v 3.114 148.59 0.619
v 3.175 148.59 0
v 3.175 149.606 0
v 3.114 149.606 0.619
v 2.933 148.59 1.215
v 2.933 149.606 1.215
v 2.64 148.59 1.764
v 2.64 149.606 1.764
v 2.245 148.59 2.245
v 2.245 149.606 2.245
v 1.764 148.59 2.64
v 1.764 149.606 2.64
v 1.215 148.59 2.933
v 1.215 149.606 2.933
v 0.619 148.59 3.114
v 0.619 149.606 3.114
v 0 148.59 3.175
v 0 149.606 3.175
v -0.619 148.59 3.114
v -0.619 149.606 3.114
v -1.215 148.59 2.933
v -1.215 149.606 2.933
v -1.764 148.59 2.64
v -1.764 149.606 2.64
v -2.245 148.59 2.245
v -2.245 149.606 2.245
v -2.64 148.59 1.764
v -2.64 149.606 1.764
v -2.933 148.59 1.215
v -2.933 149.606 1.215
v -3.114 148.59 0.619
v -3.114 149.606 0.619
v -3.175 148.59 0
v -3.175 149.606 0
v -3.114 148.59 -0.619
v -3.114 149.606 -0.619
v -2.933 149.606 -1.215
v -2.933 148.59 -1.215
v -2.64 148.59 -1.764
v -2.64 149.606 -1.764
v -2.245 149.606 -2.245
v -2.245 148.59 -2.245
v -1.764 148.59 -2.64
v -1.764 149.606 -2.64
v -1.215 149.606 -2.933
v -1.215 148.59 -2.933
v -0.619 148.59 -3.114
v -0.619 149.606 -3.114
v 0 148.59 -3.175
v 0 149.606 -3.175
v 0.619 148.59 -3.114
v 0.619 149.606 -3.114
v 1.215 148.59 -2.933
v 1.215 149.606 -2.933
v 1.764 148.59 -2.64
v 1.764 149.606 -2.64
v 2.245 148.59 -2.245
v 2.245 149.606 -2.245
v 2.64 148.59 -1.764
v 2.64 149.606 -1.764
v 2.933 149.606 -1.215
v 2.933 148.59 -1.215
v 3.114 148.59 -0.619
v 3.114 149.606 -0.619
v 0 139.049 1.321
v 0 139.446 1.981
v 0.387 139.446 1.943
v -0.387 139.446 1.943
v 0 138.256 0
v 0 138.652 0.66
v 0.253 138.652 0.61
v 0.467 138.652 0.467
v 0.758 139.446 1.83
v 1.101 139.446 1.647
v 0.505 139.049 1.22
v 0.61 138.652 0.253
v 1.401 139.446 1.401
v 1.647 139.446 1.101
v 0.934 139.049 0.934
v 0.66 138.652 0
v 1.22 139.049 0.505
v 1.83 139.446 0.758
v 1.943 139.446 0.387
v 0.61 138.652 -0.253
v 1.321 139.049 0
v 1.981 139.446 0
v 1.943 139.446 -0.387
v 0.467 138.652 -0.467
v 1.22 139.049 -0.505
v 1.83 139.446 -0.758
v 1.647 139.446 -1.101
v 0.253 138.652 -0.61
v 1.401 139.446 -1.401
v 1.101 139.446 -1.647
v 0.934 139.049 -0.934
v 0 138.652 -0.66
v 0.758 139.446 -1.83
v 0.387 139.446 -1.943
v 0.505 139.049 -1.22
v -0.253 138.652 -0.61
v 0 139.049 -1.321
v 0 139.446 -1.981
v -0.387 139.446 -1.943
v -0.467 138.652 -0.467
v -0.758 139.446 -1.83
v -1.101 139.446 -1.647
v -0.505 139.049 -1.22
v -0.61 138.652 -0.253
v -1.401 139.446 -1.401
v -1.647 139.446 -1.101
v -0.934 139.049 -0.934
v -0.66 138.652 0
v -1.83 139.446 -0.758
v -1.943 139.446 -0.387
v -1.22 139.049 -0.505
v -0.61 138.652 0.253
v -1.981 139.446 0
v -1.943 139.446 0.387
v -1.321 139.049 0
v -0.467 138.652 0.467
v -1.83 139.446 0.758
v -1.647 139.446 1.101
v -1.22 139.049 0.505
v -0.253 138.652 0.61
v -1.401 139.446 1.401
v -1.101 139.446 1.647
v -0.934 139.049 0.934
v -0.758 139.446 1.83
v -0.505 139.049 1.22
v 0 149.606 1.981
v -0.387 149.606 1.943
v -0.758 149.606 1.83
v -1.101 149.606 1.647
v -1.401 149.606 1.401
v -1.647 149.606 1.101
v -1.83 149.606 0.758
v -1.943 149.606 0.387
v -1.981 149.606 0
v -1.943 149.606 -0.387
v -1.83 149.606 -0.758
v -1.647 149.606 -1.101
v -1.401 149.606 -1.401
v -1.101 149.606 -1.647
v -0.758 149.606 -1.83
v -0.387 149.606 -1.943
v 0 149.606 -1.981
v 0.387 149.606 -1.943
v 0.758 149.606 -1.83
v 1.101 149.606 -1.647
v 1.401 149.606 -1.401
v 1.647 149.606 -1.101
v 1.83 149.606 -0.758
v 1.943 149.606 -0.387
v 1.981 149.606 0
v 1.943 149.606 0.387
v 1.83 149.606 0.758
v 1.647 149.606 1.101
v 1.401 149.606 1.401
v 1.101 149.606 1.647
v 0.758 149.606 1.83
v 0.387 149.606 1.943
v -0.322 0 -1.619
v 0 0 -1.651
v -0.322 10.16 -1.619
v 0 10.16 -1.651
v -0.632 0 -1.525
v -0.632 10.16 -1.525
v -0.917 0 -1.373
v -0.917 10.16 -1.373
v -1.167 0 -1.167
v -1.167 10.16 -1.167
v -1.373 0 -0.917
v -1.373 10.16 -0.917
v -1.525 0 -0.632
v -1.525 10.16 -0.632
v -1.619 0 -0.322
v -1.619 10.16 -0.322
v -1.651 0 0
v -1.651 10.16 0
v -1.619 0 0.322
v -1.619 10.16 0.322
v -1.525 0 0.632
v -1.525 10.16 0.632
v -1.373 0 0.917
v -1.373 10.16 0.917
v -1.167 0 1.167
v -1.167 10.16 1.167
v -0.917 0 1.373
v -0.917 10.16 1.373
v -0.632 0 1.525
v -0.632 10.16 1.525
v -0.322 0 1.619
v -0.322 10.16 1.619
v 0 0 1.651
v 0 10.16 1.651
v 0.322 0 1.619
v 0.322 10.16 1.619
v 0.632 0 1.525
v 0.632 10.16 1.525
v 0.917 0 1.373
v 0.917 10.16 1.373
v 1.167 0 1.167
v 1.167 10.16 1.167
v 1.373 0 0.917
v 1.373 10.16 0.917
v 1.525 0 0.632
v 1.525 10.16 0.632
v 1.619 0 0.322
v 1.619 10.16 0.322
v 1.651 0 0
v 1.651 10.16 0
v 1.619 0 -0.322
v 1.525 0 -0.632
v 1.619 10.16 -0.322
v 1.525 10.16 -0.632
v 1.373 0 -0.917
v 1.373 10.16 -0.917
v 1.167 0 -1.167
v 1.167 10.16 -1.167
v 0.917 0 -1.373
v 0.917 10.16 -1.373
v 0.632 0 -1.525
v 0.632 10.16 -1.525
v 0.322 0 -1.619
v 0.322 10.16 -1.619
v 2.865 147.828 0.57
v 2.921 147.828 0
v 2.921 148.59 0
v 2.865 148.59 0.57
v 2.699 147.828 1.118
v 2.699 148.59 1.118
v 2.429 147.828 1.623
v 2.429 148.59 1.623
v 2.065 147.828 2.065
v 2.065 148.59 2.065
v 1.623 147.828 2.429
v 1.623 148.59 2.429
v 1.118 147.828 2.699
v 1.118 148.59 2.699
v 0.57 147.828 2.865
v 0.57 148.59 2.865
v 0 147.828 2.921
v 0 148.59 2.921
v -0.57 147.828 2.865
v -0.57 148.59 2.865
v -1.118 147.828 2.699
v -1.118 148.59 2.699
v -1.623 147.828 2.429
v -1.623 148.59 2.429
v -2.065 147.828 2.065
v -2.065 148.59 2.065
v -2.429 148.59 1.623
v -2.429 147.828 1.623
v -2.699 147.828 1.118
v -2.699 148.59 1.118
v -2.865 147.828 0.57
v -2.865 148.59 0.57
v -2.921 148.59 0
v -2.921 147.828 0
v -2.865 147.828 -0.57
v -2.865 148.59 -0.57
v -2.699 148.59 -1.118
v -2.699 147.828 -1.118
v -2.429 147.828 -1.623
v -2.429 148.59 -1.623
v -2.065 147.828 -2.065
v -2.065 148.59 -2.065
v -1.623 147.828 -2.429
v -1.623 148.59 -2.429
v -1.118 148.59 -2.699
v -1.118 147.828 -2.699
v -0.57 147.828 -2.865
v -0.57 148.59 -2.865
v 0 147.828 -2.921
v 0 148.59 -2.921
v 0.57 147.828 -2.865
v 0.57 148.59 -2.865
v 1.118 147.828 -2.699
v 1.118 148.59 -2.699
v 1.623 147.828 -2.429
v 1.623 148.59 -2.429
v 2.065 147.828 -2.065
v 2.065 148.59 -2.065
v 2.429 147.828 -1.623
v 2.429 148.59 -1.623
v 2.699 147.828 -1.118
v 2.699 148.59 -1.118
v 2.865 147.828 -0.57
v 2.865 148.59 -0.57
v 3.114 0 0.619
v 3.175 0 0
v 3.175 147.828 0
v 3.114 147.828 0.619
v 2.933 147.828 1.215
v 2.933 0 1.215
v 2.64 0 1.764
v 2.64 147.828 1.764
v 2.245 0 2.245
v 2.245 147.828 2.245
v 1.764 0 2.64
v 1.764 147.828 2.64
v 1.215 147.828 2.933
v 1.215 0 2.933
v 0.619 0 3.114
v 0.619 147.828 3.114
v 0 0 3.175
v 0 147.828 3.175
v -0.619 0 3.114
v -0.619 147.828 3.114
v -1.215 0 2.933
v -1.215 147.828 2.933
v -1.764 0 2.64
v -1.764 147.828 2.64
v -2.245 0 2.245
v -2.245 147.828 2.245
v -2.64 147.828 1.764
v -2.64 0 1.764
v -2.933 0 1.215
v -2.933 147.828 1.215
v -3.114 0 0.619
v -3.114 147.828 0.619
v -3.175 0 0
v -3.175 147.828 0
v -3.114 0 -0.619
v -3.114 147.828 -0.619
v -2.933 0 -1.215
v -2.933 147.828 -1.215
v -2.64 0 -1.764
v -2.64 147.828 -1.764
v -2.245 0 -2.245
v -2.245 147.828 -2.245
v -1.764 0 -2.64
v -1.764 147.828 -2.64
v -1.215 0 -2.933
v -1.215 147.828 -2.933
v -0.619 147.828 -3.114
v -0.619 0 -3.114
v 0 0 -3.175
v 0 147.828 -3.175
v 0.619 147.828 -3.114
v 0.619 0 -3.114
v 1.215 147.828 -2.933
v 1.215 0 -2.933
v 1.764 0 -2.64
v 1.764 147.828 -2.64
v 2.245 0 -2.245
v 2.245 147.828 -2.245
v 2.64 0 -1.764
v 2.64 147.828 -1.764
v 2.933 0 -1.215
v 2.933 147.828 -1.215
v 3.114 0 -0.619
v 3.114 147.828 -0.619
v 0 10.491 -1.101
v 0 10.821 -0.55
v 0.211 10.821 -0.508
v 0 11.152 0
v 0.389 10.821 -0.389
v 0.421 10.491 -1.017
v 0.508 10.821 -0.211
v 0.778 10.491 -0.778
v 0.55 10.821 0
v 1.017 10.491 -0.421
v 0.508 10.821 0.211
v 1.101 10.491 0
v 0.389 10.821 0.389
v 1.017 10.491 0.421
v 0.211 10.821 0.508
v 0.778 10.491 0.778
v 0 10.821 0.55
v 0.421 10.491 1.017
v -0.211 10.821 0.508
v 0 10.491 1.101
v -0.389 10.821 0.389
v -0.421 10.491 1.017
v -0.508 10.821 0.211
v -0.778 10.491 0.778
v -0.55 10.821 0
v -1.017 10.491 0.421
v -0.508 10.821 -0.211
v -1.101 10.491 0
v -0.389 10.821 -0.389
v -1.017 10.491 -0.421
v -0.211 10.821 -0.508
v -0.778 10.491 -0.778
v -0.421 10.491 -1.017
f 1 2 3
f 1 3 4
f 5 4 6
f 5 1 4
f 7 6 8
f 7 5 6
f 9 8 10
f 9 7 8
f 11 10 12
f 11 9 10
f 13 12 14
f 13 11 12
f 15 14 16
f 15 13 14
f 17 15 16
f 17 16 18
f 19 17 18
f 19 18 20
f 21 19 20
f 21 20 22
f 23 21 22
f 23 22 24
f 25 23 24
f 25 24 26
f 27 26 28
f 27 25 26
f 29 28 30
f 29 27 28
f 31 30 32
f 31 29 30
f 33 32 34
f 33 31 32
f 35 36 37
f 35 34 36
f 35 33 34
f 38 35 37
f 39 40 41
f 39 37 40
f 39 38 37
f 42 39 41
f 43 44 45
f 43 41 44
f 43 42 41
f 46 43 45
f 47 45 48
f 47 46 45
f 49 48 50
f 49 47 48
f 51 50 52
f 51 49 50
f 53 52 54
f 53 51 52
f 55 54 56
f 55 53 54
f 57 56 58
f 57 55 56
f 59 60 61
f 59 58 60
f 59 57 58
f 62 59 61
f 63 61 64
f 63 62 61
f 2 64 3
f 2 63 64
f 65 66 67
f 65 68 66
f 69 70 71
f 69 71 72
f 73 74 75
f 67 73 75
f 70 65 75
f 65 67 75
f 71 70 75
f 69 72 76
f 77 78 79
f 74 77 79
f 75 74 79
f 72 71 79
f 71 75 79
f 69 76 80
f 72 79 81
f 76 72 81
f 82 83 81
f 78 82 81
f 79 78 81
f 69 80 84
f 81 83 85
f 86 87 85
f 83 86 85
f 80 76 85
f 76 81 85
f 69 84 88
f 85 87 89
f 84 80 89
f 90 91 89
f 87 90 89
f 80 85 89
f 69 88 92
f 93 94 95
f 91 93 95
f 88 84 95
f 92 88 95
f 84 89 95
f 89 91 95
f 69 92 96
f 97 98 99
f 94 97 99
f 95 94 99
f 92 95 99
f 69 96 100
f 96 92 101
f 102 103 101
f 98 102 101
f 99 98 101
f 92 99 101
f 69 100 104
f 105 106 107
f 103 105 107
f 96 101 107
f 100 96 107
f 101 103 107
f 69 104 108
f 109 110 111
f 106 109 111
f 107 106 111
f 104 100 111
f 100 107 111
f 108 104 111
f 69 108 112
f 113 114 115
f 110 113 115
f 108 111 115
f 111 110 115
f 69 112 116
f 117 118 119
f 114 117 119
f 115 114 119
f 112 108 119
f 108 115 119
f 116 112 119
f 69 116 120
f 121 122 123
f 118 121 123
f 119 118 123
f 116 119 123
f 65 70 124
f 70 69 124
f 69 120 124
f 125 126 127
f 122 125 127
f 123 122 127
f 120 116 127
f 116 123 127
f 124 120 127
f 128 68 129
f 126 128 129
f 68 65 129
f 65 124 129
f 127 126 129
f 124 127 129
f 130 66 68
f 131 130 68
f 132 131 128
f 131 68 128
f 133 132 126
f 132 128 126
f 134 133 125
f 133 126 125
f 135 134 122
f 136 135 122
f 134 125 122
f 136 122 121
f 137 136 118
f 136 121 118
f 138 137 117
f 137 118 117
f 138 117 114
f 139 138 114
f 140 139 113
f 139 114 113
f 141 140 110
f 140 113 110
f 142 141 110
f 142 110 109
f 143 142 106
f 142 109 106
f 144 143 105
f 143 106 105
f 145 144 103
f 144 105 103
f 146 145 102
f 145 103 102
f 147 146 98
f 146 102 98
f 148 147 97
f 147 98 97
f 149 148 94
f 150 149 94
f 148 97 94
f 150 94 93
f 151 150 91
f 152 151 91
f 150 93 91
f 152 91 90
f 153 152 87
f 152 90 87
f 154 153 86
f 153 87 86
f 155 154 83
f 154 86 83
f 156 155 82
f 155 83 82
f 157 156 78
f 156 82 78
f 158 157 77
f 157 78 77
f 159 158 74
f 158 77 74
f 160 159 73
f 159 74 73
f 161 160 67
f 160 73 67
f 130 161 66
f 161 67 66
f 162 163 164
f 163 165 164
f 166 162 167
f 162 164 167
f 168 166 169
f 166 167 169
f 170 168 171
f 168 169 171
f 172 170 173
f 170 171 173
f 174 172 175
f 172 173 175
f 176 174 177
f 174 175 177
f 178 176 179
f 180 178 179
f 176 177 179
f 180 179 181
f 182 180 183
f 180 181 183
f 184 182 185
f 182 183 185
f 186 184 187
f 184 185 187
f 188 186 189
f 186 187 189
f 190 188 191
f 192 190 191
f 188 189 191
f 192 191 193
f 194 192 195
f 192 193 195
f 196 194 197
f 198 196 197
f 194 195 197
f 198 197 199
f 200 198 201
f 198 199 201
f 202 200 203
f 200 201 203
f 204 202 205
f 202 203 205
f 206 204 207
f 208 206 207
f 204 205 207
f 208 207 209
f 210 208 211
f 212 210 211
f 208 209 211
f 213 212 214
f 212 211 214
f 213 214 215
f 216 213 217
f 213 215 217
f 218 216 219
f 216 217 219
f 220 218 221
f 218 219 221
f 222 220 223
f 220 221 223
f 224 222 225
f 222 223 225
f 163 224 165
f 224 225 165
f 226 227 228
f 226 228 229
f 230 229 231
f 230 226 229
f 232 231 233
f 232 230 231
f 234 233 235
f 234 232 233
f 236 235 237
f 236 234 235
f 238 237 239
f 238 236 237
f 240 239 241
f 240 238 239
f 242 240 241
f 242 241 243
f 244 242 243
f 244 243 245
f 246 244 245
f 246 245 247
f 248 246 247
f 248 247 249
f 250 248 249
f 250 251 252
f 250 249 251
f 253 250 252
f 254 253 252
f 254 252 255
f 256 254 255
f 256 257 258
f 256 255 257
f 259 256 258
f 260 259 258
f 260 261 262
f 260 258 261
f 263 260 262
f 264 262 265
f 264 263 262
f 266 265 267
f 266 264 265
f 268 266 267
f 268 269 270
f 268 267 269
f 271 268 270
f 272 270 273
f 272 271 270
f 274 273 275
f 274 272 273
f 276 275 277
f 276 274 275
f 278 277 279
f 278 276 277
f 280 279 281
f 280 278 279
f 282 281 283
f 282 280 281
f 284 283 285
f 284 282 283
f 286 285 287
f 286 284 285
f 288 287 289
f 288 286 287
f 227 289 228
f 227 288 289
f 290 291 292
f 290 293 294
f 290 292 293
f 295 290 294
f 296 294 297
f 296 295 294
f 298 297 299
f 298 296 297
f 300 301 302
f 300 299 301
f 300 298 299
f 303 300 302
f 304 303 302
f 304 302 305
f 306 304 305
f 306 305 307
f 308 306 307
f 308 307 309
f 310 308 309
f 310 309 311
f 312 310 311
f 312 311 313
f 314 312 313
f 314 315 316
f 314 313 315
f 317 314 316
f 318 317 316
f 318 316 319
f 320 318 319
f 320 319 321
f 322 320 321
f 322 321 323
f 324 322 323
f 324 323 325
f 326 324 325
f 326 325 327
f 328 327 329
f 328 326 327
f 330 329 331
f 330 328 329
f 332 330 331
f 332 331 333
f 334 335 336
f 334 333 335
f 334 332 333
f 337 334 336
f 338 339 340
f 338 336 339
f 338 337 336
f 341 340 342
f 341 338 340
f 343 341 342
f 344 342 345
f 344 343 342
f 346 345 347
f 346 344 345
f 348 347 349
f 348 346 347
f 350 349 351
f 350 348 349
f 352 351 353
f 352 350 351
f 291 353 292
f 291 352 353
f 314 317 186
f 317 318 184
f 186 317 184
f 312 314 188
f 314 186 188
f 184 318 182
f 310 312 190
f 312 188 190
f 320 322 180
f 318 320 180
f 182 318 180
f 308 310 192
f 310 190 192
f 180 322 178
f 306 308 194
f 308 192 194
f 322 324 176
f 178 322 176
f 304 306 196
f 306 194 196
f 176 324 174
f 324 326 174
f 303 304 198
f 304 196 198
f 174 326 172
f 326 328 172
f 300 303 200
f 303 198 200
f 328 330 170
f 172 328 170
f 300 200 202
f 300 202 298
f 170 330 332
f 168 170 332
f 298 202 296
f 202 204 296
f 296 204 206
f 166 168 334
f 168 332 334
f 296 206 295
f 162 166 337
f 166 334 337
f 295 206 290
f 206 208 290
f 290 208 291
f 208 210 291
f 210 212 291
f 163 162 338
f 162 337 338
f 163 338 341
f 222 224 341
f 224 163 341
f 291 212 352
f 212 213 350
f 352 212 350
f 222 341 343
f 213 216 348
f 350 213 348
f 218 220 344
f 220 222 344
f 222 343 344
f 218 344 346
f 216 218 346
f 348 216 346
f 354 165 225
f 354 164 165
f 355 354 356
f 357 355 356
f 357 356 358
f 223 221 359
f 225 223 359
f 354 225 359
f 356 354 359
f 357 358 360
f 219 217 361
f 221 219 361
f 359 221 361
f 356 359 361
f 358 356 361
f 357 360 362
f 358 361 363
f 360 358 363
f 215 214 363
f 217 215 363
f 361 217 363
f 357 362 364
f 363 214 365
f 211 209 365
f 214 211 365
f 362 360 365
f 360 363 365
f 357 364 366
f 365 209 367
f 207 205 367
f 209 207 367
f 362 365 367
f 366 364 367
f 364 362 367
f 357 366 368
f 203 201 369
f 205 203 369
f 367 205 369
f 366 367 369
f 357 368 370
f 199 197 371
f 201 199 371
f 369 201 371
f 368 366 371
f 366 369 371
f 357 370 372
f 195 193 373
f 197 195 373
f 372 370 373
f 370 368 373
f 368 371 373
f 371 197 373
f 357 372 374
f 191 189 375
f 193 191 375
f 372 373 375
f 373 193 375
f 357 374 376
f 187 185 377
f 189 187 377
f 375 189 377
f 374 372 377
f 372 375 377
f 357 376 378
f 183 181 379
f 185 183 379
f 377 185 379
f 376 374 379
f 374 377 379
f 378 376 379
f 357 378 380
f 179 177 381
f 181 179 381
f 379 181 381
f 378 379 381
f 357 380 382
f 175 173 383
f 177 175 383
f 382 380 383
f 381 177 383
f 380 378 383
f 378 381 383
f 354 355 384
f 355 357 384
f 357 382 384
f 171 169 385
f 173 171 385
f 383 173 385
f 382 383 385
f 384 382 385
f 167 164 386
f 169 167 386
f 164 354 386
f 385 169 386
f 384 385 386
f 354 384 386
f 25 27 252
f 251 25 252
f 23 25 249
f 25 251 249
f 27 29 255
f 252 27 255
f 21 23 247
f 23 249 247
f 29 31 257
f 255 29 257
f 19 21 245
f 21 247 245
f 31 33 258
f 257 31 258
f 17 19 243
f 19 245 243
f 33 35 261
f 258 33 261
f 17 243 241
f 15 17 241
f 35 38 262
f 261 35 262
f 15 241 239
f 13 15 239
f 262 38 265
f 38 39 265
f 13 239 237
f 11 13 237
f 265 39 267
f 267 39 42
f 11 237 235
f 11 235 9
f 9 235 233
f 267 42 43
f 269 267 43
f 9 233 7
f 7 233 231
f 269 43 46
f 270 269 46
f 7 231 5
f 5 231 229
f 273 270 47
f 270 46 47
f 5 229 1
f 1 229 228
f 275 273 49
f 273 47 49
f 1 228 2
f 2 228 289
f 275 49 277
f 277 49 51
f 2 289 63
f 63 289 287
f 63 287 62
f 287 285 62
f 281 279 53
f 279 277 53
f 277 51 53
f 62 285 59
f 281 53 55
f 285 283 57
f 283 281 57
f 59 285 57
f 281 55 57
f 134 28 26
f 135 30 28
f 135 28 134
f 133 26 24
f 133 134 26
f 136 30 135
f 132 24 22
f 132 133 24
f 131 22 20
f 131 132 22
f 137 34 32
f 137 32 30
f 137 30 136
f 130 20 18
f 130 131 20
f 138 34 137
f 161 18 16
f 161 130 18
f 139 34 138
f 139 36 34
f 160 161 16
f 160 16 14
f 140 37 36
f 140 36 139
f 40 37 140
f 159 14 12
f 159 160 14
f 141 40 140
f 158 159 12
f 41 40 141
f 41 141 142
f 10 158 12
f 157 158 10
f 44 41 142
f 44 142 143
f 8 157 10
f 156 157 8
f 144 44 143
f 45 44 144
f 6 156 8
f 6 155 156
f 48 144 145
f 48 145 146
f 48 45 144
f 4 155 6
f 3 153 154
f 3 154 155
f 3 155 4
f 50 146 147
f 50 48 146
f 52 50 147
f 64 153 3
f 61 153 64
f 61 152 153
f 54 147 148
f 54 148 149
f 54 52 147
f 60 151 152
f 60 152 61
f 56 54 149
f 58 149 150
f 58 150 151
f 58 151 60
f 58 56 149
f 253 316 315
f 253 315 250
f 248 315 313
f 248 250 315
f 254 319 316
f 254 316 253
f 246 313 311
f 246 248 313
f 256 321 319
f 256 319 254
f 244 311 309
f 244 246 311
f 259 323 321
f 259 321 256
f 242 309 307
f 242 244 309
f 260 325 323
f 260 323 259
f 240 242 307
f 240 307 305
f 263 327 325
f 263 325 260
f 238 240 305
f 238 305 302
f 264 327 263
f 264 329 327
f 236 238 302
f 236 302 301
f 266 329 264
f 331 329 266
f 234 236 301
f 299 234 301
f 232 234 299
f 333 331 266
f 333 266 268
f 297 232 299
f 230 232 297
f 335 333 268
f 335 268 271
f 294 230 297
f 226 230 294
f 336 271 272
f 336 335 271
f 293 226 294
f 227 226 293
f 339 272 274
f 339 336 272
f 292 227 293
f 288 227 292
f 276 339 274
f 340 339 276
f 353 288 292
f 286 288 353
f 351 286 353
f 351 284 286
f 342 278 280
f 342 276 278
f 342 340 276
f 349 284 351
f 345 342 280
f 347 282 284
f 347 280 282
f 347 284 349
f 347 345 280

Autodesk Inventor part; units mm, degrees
ref_plane "YZ Plane" through (0, 0, 0) normal (1, 0, 0) x (0, 1, 0)
ref_plane "XZ Plane" through (0, 0, 0) normal (0, 1, 0) x (-1, 0, 0)
ref_plane "XY Plane" through (0, 0, 0) normal (0, 0, 1) x (1, 0, 0)
sketch "Sketch1" plane through (0, 0, 0) normal (0, 0, 1) x (1, 0, 0)
  line L0 (0, 0) -> (0, 149.606)
  line L1 (0, 149.606) -> (3.175, 149.606)
  line L2 (3.175, 149.606) -> (3.175, 148.59)
  line L3 (3.175, 148.59) -> (2.921, 148.59)
  line L4 (2.921, 148.59) -> (2.921, 147.828)
  line L5 (2.921, 147.828) -> (3.175, 147.828)
  line L6 (3.175, 147.828) -> (3.175, 0)
  line L7 (3.175, 0) -> (0, 0)
  dimension "d0" = 3.175
  dimension "d1" = 149.606
  dimension "d2" = 0.762
  dimension "d3" = 0.254
  dimension "d4" = 1.016
revolve "Revolution1" add sketch "Sketch1" angle 360 about axis through (0, 0, 0) along (0, 1, 0)
sketch "Sketch2" plane through (0, 149.606, 0) normal (0, 1, 0) x (1, 0, 0)
  point P0 (0, 0)
  point P1 (0, 0)
hole "Hole1" at (0, 149.606, 0) direction (0, -1, 0) diameter 3.9624 depth 10.16 tip angle 118 thread size "10-32 UNF" class "2B" standard "ANSI Unified Screw Threads"
sketch "Sketch3" plane through (0, 0, 0) normal (0, -1, 0) x (1, 0, 0)
  point P0 (0, 0)
  point P1 (0, 0)
hole "Hole2" at (0, 0, 0) direction (0, 1, 0) diameter 3.302 depth 10.16 tip angle 118 thread size "8-32 UNC" class "2B" standard "ANSI Unified Screw Threads"
properties part number "Fixture_Weight_Shaft-02" material "Stainless Steel"
